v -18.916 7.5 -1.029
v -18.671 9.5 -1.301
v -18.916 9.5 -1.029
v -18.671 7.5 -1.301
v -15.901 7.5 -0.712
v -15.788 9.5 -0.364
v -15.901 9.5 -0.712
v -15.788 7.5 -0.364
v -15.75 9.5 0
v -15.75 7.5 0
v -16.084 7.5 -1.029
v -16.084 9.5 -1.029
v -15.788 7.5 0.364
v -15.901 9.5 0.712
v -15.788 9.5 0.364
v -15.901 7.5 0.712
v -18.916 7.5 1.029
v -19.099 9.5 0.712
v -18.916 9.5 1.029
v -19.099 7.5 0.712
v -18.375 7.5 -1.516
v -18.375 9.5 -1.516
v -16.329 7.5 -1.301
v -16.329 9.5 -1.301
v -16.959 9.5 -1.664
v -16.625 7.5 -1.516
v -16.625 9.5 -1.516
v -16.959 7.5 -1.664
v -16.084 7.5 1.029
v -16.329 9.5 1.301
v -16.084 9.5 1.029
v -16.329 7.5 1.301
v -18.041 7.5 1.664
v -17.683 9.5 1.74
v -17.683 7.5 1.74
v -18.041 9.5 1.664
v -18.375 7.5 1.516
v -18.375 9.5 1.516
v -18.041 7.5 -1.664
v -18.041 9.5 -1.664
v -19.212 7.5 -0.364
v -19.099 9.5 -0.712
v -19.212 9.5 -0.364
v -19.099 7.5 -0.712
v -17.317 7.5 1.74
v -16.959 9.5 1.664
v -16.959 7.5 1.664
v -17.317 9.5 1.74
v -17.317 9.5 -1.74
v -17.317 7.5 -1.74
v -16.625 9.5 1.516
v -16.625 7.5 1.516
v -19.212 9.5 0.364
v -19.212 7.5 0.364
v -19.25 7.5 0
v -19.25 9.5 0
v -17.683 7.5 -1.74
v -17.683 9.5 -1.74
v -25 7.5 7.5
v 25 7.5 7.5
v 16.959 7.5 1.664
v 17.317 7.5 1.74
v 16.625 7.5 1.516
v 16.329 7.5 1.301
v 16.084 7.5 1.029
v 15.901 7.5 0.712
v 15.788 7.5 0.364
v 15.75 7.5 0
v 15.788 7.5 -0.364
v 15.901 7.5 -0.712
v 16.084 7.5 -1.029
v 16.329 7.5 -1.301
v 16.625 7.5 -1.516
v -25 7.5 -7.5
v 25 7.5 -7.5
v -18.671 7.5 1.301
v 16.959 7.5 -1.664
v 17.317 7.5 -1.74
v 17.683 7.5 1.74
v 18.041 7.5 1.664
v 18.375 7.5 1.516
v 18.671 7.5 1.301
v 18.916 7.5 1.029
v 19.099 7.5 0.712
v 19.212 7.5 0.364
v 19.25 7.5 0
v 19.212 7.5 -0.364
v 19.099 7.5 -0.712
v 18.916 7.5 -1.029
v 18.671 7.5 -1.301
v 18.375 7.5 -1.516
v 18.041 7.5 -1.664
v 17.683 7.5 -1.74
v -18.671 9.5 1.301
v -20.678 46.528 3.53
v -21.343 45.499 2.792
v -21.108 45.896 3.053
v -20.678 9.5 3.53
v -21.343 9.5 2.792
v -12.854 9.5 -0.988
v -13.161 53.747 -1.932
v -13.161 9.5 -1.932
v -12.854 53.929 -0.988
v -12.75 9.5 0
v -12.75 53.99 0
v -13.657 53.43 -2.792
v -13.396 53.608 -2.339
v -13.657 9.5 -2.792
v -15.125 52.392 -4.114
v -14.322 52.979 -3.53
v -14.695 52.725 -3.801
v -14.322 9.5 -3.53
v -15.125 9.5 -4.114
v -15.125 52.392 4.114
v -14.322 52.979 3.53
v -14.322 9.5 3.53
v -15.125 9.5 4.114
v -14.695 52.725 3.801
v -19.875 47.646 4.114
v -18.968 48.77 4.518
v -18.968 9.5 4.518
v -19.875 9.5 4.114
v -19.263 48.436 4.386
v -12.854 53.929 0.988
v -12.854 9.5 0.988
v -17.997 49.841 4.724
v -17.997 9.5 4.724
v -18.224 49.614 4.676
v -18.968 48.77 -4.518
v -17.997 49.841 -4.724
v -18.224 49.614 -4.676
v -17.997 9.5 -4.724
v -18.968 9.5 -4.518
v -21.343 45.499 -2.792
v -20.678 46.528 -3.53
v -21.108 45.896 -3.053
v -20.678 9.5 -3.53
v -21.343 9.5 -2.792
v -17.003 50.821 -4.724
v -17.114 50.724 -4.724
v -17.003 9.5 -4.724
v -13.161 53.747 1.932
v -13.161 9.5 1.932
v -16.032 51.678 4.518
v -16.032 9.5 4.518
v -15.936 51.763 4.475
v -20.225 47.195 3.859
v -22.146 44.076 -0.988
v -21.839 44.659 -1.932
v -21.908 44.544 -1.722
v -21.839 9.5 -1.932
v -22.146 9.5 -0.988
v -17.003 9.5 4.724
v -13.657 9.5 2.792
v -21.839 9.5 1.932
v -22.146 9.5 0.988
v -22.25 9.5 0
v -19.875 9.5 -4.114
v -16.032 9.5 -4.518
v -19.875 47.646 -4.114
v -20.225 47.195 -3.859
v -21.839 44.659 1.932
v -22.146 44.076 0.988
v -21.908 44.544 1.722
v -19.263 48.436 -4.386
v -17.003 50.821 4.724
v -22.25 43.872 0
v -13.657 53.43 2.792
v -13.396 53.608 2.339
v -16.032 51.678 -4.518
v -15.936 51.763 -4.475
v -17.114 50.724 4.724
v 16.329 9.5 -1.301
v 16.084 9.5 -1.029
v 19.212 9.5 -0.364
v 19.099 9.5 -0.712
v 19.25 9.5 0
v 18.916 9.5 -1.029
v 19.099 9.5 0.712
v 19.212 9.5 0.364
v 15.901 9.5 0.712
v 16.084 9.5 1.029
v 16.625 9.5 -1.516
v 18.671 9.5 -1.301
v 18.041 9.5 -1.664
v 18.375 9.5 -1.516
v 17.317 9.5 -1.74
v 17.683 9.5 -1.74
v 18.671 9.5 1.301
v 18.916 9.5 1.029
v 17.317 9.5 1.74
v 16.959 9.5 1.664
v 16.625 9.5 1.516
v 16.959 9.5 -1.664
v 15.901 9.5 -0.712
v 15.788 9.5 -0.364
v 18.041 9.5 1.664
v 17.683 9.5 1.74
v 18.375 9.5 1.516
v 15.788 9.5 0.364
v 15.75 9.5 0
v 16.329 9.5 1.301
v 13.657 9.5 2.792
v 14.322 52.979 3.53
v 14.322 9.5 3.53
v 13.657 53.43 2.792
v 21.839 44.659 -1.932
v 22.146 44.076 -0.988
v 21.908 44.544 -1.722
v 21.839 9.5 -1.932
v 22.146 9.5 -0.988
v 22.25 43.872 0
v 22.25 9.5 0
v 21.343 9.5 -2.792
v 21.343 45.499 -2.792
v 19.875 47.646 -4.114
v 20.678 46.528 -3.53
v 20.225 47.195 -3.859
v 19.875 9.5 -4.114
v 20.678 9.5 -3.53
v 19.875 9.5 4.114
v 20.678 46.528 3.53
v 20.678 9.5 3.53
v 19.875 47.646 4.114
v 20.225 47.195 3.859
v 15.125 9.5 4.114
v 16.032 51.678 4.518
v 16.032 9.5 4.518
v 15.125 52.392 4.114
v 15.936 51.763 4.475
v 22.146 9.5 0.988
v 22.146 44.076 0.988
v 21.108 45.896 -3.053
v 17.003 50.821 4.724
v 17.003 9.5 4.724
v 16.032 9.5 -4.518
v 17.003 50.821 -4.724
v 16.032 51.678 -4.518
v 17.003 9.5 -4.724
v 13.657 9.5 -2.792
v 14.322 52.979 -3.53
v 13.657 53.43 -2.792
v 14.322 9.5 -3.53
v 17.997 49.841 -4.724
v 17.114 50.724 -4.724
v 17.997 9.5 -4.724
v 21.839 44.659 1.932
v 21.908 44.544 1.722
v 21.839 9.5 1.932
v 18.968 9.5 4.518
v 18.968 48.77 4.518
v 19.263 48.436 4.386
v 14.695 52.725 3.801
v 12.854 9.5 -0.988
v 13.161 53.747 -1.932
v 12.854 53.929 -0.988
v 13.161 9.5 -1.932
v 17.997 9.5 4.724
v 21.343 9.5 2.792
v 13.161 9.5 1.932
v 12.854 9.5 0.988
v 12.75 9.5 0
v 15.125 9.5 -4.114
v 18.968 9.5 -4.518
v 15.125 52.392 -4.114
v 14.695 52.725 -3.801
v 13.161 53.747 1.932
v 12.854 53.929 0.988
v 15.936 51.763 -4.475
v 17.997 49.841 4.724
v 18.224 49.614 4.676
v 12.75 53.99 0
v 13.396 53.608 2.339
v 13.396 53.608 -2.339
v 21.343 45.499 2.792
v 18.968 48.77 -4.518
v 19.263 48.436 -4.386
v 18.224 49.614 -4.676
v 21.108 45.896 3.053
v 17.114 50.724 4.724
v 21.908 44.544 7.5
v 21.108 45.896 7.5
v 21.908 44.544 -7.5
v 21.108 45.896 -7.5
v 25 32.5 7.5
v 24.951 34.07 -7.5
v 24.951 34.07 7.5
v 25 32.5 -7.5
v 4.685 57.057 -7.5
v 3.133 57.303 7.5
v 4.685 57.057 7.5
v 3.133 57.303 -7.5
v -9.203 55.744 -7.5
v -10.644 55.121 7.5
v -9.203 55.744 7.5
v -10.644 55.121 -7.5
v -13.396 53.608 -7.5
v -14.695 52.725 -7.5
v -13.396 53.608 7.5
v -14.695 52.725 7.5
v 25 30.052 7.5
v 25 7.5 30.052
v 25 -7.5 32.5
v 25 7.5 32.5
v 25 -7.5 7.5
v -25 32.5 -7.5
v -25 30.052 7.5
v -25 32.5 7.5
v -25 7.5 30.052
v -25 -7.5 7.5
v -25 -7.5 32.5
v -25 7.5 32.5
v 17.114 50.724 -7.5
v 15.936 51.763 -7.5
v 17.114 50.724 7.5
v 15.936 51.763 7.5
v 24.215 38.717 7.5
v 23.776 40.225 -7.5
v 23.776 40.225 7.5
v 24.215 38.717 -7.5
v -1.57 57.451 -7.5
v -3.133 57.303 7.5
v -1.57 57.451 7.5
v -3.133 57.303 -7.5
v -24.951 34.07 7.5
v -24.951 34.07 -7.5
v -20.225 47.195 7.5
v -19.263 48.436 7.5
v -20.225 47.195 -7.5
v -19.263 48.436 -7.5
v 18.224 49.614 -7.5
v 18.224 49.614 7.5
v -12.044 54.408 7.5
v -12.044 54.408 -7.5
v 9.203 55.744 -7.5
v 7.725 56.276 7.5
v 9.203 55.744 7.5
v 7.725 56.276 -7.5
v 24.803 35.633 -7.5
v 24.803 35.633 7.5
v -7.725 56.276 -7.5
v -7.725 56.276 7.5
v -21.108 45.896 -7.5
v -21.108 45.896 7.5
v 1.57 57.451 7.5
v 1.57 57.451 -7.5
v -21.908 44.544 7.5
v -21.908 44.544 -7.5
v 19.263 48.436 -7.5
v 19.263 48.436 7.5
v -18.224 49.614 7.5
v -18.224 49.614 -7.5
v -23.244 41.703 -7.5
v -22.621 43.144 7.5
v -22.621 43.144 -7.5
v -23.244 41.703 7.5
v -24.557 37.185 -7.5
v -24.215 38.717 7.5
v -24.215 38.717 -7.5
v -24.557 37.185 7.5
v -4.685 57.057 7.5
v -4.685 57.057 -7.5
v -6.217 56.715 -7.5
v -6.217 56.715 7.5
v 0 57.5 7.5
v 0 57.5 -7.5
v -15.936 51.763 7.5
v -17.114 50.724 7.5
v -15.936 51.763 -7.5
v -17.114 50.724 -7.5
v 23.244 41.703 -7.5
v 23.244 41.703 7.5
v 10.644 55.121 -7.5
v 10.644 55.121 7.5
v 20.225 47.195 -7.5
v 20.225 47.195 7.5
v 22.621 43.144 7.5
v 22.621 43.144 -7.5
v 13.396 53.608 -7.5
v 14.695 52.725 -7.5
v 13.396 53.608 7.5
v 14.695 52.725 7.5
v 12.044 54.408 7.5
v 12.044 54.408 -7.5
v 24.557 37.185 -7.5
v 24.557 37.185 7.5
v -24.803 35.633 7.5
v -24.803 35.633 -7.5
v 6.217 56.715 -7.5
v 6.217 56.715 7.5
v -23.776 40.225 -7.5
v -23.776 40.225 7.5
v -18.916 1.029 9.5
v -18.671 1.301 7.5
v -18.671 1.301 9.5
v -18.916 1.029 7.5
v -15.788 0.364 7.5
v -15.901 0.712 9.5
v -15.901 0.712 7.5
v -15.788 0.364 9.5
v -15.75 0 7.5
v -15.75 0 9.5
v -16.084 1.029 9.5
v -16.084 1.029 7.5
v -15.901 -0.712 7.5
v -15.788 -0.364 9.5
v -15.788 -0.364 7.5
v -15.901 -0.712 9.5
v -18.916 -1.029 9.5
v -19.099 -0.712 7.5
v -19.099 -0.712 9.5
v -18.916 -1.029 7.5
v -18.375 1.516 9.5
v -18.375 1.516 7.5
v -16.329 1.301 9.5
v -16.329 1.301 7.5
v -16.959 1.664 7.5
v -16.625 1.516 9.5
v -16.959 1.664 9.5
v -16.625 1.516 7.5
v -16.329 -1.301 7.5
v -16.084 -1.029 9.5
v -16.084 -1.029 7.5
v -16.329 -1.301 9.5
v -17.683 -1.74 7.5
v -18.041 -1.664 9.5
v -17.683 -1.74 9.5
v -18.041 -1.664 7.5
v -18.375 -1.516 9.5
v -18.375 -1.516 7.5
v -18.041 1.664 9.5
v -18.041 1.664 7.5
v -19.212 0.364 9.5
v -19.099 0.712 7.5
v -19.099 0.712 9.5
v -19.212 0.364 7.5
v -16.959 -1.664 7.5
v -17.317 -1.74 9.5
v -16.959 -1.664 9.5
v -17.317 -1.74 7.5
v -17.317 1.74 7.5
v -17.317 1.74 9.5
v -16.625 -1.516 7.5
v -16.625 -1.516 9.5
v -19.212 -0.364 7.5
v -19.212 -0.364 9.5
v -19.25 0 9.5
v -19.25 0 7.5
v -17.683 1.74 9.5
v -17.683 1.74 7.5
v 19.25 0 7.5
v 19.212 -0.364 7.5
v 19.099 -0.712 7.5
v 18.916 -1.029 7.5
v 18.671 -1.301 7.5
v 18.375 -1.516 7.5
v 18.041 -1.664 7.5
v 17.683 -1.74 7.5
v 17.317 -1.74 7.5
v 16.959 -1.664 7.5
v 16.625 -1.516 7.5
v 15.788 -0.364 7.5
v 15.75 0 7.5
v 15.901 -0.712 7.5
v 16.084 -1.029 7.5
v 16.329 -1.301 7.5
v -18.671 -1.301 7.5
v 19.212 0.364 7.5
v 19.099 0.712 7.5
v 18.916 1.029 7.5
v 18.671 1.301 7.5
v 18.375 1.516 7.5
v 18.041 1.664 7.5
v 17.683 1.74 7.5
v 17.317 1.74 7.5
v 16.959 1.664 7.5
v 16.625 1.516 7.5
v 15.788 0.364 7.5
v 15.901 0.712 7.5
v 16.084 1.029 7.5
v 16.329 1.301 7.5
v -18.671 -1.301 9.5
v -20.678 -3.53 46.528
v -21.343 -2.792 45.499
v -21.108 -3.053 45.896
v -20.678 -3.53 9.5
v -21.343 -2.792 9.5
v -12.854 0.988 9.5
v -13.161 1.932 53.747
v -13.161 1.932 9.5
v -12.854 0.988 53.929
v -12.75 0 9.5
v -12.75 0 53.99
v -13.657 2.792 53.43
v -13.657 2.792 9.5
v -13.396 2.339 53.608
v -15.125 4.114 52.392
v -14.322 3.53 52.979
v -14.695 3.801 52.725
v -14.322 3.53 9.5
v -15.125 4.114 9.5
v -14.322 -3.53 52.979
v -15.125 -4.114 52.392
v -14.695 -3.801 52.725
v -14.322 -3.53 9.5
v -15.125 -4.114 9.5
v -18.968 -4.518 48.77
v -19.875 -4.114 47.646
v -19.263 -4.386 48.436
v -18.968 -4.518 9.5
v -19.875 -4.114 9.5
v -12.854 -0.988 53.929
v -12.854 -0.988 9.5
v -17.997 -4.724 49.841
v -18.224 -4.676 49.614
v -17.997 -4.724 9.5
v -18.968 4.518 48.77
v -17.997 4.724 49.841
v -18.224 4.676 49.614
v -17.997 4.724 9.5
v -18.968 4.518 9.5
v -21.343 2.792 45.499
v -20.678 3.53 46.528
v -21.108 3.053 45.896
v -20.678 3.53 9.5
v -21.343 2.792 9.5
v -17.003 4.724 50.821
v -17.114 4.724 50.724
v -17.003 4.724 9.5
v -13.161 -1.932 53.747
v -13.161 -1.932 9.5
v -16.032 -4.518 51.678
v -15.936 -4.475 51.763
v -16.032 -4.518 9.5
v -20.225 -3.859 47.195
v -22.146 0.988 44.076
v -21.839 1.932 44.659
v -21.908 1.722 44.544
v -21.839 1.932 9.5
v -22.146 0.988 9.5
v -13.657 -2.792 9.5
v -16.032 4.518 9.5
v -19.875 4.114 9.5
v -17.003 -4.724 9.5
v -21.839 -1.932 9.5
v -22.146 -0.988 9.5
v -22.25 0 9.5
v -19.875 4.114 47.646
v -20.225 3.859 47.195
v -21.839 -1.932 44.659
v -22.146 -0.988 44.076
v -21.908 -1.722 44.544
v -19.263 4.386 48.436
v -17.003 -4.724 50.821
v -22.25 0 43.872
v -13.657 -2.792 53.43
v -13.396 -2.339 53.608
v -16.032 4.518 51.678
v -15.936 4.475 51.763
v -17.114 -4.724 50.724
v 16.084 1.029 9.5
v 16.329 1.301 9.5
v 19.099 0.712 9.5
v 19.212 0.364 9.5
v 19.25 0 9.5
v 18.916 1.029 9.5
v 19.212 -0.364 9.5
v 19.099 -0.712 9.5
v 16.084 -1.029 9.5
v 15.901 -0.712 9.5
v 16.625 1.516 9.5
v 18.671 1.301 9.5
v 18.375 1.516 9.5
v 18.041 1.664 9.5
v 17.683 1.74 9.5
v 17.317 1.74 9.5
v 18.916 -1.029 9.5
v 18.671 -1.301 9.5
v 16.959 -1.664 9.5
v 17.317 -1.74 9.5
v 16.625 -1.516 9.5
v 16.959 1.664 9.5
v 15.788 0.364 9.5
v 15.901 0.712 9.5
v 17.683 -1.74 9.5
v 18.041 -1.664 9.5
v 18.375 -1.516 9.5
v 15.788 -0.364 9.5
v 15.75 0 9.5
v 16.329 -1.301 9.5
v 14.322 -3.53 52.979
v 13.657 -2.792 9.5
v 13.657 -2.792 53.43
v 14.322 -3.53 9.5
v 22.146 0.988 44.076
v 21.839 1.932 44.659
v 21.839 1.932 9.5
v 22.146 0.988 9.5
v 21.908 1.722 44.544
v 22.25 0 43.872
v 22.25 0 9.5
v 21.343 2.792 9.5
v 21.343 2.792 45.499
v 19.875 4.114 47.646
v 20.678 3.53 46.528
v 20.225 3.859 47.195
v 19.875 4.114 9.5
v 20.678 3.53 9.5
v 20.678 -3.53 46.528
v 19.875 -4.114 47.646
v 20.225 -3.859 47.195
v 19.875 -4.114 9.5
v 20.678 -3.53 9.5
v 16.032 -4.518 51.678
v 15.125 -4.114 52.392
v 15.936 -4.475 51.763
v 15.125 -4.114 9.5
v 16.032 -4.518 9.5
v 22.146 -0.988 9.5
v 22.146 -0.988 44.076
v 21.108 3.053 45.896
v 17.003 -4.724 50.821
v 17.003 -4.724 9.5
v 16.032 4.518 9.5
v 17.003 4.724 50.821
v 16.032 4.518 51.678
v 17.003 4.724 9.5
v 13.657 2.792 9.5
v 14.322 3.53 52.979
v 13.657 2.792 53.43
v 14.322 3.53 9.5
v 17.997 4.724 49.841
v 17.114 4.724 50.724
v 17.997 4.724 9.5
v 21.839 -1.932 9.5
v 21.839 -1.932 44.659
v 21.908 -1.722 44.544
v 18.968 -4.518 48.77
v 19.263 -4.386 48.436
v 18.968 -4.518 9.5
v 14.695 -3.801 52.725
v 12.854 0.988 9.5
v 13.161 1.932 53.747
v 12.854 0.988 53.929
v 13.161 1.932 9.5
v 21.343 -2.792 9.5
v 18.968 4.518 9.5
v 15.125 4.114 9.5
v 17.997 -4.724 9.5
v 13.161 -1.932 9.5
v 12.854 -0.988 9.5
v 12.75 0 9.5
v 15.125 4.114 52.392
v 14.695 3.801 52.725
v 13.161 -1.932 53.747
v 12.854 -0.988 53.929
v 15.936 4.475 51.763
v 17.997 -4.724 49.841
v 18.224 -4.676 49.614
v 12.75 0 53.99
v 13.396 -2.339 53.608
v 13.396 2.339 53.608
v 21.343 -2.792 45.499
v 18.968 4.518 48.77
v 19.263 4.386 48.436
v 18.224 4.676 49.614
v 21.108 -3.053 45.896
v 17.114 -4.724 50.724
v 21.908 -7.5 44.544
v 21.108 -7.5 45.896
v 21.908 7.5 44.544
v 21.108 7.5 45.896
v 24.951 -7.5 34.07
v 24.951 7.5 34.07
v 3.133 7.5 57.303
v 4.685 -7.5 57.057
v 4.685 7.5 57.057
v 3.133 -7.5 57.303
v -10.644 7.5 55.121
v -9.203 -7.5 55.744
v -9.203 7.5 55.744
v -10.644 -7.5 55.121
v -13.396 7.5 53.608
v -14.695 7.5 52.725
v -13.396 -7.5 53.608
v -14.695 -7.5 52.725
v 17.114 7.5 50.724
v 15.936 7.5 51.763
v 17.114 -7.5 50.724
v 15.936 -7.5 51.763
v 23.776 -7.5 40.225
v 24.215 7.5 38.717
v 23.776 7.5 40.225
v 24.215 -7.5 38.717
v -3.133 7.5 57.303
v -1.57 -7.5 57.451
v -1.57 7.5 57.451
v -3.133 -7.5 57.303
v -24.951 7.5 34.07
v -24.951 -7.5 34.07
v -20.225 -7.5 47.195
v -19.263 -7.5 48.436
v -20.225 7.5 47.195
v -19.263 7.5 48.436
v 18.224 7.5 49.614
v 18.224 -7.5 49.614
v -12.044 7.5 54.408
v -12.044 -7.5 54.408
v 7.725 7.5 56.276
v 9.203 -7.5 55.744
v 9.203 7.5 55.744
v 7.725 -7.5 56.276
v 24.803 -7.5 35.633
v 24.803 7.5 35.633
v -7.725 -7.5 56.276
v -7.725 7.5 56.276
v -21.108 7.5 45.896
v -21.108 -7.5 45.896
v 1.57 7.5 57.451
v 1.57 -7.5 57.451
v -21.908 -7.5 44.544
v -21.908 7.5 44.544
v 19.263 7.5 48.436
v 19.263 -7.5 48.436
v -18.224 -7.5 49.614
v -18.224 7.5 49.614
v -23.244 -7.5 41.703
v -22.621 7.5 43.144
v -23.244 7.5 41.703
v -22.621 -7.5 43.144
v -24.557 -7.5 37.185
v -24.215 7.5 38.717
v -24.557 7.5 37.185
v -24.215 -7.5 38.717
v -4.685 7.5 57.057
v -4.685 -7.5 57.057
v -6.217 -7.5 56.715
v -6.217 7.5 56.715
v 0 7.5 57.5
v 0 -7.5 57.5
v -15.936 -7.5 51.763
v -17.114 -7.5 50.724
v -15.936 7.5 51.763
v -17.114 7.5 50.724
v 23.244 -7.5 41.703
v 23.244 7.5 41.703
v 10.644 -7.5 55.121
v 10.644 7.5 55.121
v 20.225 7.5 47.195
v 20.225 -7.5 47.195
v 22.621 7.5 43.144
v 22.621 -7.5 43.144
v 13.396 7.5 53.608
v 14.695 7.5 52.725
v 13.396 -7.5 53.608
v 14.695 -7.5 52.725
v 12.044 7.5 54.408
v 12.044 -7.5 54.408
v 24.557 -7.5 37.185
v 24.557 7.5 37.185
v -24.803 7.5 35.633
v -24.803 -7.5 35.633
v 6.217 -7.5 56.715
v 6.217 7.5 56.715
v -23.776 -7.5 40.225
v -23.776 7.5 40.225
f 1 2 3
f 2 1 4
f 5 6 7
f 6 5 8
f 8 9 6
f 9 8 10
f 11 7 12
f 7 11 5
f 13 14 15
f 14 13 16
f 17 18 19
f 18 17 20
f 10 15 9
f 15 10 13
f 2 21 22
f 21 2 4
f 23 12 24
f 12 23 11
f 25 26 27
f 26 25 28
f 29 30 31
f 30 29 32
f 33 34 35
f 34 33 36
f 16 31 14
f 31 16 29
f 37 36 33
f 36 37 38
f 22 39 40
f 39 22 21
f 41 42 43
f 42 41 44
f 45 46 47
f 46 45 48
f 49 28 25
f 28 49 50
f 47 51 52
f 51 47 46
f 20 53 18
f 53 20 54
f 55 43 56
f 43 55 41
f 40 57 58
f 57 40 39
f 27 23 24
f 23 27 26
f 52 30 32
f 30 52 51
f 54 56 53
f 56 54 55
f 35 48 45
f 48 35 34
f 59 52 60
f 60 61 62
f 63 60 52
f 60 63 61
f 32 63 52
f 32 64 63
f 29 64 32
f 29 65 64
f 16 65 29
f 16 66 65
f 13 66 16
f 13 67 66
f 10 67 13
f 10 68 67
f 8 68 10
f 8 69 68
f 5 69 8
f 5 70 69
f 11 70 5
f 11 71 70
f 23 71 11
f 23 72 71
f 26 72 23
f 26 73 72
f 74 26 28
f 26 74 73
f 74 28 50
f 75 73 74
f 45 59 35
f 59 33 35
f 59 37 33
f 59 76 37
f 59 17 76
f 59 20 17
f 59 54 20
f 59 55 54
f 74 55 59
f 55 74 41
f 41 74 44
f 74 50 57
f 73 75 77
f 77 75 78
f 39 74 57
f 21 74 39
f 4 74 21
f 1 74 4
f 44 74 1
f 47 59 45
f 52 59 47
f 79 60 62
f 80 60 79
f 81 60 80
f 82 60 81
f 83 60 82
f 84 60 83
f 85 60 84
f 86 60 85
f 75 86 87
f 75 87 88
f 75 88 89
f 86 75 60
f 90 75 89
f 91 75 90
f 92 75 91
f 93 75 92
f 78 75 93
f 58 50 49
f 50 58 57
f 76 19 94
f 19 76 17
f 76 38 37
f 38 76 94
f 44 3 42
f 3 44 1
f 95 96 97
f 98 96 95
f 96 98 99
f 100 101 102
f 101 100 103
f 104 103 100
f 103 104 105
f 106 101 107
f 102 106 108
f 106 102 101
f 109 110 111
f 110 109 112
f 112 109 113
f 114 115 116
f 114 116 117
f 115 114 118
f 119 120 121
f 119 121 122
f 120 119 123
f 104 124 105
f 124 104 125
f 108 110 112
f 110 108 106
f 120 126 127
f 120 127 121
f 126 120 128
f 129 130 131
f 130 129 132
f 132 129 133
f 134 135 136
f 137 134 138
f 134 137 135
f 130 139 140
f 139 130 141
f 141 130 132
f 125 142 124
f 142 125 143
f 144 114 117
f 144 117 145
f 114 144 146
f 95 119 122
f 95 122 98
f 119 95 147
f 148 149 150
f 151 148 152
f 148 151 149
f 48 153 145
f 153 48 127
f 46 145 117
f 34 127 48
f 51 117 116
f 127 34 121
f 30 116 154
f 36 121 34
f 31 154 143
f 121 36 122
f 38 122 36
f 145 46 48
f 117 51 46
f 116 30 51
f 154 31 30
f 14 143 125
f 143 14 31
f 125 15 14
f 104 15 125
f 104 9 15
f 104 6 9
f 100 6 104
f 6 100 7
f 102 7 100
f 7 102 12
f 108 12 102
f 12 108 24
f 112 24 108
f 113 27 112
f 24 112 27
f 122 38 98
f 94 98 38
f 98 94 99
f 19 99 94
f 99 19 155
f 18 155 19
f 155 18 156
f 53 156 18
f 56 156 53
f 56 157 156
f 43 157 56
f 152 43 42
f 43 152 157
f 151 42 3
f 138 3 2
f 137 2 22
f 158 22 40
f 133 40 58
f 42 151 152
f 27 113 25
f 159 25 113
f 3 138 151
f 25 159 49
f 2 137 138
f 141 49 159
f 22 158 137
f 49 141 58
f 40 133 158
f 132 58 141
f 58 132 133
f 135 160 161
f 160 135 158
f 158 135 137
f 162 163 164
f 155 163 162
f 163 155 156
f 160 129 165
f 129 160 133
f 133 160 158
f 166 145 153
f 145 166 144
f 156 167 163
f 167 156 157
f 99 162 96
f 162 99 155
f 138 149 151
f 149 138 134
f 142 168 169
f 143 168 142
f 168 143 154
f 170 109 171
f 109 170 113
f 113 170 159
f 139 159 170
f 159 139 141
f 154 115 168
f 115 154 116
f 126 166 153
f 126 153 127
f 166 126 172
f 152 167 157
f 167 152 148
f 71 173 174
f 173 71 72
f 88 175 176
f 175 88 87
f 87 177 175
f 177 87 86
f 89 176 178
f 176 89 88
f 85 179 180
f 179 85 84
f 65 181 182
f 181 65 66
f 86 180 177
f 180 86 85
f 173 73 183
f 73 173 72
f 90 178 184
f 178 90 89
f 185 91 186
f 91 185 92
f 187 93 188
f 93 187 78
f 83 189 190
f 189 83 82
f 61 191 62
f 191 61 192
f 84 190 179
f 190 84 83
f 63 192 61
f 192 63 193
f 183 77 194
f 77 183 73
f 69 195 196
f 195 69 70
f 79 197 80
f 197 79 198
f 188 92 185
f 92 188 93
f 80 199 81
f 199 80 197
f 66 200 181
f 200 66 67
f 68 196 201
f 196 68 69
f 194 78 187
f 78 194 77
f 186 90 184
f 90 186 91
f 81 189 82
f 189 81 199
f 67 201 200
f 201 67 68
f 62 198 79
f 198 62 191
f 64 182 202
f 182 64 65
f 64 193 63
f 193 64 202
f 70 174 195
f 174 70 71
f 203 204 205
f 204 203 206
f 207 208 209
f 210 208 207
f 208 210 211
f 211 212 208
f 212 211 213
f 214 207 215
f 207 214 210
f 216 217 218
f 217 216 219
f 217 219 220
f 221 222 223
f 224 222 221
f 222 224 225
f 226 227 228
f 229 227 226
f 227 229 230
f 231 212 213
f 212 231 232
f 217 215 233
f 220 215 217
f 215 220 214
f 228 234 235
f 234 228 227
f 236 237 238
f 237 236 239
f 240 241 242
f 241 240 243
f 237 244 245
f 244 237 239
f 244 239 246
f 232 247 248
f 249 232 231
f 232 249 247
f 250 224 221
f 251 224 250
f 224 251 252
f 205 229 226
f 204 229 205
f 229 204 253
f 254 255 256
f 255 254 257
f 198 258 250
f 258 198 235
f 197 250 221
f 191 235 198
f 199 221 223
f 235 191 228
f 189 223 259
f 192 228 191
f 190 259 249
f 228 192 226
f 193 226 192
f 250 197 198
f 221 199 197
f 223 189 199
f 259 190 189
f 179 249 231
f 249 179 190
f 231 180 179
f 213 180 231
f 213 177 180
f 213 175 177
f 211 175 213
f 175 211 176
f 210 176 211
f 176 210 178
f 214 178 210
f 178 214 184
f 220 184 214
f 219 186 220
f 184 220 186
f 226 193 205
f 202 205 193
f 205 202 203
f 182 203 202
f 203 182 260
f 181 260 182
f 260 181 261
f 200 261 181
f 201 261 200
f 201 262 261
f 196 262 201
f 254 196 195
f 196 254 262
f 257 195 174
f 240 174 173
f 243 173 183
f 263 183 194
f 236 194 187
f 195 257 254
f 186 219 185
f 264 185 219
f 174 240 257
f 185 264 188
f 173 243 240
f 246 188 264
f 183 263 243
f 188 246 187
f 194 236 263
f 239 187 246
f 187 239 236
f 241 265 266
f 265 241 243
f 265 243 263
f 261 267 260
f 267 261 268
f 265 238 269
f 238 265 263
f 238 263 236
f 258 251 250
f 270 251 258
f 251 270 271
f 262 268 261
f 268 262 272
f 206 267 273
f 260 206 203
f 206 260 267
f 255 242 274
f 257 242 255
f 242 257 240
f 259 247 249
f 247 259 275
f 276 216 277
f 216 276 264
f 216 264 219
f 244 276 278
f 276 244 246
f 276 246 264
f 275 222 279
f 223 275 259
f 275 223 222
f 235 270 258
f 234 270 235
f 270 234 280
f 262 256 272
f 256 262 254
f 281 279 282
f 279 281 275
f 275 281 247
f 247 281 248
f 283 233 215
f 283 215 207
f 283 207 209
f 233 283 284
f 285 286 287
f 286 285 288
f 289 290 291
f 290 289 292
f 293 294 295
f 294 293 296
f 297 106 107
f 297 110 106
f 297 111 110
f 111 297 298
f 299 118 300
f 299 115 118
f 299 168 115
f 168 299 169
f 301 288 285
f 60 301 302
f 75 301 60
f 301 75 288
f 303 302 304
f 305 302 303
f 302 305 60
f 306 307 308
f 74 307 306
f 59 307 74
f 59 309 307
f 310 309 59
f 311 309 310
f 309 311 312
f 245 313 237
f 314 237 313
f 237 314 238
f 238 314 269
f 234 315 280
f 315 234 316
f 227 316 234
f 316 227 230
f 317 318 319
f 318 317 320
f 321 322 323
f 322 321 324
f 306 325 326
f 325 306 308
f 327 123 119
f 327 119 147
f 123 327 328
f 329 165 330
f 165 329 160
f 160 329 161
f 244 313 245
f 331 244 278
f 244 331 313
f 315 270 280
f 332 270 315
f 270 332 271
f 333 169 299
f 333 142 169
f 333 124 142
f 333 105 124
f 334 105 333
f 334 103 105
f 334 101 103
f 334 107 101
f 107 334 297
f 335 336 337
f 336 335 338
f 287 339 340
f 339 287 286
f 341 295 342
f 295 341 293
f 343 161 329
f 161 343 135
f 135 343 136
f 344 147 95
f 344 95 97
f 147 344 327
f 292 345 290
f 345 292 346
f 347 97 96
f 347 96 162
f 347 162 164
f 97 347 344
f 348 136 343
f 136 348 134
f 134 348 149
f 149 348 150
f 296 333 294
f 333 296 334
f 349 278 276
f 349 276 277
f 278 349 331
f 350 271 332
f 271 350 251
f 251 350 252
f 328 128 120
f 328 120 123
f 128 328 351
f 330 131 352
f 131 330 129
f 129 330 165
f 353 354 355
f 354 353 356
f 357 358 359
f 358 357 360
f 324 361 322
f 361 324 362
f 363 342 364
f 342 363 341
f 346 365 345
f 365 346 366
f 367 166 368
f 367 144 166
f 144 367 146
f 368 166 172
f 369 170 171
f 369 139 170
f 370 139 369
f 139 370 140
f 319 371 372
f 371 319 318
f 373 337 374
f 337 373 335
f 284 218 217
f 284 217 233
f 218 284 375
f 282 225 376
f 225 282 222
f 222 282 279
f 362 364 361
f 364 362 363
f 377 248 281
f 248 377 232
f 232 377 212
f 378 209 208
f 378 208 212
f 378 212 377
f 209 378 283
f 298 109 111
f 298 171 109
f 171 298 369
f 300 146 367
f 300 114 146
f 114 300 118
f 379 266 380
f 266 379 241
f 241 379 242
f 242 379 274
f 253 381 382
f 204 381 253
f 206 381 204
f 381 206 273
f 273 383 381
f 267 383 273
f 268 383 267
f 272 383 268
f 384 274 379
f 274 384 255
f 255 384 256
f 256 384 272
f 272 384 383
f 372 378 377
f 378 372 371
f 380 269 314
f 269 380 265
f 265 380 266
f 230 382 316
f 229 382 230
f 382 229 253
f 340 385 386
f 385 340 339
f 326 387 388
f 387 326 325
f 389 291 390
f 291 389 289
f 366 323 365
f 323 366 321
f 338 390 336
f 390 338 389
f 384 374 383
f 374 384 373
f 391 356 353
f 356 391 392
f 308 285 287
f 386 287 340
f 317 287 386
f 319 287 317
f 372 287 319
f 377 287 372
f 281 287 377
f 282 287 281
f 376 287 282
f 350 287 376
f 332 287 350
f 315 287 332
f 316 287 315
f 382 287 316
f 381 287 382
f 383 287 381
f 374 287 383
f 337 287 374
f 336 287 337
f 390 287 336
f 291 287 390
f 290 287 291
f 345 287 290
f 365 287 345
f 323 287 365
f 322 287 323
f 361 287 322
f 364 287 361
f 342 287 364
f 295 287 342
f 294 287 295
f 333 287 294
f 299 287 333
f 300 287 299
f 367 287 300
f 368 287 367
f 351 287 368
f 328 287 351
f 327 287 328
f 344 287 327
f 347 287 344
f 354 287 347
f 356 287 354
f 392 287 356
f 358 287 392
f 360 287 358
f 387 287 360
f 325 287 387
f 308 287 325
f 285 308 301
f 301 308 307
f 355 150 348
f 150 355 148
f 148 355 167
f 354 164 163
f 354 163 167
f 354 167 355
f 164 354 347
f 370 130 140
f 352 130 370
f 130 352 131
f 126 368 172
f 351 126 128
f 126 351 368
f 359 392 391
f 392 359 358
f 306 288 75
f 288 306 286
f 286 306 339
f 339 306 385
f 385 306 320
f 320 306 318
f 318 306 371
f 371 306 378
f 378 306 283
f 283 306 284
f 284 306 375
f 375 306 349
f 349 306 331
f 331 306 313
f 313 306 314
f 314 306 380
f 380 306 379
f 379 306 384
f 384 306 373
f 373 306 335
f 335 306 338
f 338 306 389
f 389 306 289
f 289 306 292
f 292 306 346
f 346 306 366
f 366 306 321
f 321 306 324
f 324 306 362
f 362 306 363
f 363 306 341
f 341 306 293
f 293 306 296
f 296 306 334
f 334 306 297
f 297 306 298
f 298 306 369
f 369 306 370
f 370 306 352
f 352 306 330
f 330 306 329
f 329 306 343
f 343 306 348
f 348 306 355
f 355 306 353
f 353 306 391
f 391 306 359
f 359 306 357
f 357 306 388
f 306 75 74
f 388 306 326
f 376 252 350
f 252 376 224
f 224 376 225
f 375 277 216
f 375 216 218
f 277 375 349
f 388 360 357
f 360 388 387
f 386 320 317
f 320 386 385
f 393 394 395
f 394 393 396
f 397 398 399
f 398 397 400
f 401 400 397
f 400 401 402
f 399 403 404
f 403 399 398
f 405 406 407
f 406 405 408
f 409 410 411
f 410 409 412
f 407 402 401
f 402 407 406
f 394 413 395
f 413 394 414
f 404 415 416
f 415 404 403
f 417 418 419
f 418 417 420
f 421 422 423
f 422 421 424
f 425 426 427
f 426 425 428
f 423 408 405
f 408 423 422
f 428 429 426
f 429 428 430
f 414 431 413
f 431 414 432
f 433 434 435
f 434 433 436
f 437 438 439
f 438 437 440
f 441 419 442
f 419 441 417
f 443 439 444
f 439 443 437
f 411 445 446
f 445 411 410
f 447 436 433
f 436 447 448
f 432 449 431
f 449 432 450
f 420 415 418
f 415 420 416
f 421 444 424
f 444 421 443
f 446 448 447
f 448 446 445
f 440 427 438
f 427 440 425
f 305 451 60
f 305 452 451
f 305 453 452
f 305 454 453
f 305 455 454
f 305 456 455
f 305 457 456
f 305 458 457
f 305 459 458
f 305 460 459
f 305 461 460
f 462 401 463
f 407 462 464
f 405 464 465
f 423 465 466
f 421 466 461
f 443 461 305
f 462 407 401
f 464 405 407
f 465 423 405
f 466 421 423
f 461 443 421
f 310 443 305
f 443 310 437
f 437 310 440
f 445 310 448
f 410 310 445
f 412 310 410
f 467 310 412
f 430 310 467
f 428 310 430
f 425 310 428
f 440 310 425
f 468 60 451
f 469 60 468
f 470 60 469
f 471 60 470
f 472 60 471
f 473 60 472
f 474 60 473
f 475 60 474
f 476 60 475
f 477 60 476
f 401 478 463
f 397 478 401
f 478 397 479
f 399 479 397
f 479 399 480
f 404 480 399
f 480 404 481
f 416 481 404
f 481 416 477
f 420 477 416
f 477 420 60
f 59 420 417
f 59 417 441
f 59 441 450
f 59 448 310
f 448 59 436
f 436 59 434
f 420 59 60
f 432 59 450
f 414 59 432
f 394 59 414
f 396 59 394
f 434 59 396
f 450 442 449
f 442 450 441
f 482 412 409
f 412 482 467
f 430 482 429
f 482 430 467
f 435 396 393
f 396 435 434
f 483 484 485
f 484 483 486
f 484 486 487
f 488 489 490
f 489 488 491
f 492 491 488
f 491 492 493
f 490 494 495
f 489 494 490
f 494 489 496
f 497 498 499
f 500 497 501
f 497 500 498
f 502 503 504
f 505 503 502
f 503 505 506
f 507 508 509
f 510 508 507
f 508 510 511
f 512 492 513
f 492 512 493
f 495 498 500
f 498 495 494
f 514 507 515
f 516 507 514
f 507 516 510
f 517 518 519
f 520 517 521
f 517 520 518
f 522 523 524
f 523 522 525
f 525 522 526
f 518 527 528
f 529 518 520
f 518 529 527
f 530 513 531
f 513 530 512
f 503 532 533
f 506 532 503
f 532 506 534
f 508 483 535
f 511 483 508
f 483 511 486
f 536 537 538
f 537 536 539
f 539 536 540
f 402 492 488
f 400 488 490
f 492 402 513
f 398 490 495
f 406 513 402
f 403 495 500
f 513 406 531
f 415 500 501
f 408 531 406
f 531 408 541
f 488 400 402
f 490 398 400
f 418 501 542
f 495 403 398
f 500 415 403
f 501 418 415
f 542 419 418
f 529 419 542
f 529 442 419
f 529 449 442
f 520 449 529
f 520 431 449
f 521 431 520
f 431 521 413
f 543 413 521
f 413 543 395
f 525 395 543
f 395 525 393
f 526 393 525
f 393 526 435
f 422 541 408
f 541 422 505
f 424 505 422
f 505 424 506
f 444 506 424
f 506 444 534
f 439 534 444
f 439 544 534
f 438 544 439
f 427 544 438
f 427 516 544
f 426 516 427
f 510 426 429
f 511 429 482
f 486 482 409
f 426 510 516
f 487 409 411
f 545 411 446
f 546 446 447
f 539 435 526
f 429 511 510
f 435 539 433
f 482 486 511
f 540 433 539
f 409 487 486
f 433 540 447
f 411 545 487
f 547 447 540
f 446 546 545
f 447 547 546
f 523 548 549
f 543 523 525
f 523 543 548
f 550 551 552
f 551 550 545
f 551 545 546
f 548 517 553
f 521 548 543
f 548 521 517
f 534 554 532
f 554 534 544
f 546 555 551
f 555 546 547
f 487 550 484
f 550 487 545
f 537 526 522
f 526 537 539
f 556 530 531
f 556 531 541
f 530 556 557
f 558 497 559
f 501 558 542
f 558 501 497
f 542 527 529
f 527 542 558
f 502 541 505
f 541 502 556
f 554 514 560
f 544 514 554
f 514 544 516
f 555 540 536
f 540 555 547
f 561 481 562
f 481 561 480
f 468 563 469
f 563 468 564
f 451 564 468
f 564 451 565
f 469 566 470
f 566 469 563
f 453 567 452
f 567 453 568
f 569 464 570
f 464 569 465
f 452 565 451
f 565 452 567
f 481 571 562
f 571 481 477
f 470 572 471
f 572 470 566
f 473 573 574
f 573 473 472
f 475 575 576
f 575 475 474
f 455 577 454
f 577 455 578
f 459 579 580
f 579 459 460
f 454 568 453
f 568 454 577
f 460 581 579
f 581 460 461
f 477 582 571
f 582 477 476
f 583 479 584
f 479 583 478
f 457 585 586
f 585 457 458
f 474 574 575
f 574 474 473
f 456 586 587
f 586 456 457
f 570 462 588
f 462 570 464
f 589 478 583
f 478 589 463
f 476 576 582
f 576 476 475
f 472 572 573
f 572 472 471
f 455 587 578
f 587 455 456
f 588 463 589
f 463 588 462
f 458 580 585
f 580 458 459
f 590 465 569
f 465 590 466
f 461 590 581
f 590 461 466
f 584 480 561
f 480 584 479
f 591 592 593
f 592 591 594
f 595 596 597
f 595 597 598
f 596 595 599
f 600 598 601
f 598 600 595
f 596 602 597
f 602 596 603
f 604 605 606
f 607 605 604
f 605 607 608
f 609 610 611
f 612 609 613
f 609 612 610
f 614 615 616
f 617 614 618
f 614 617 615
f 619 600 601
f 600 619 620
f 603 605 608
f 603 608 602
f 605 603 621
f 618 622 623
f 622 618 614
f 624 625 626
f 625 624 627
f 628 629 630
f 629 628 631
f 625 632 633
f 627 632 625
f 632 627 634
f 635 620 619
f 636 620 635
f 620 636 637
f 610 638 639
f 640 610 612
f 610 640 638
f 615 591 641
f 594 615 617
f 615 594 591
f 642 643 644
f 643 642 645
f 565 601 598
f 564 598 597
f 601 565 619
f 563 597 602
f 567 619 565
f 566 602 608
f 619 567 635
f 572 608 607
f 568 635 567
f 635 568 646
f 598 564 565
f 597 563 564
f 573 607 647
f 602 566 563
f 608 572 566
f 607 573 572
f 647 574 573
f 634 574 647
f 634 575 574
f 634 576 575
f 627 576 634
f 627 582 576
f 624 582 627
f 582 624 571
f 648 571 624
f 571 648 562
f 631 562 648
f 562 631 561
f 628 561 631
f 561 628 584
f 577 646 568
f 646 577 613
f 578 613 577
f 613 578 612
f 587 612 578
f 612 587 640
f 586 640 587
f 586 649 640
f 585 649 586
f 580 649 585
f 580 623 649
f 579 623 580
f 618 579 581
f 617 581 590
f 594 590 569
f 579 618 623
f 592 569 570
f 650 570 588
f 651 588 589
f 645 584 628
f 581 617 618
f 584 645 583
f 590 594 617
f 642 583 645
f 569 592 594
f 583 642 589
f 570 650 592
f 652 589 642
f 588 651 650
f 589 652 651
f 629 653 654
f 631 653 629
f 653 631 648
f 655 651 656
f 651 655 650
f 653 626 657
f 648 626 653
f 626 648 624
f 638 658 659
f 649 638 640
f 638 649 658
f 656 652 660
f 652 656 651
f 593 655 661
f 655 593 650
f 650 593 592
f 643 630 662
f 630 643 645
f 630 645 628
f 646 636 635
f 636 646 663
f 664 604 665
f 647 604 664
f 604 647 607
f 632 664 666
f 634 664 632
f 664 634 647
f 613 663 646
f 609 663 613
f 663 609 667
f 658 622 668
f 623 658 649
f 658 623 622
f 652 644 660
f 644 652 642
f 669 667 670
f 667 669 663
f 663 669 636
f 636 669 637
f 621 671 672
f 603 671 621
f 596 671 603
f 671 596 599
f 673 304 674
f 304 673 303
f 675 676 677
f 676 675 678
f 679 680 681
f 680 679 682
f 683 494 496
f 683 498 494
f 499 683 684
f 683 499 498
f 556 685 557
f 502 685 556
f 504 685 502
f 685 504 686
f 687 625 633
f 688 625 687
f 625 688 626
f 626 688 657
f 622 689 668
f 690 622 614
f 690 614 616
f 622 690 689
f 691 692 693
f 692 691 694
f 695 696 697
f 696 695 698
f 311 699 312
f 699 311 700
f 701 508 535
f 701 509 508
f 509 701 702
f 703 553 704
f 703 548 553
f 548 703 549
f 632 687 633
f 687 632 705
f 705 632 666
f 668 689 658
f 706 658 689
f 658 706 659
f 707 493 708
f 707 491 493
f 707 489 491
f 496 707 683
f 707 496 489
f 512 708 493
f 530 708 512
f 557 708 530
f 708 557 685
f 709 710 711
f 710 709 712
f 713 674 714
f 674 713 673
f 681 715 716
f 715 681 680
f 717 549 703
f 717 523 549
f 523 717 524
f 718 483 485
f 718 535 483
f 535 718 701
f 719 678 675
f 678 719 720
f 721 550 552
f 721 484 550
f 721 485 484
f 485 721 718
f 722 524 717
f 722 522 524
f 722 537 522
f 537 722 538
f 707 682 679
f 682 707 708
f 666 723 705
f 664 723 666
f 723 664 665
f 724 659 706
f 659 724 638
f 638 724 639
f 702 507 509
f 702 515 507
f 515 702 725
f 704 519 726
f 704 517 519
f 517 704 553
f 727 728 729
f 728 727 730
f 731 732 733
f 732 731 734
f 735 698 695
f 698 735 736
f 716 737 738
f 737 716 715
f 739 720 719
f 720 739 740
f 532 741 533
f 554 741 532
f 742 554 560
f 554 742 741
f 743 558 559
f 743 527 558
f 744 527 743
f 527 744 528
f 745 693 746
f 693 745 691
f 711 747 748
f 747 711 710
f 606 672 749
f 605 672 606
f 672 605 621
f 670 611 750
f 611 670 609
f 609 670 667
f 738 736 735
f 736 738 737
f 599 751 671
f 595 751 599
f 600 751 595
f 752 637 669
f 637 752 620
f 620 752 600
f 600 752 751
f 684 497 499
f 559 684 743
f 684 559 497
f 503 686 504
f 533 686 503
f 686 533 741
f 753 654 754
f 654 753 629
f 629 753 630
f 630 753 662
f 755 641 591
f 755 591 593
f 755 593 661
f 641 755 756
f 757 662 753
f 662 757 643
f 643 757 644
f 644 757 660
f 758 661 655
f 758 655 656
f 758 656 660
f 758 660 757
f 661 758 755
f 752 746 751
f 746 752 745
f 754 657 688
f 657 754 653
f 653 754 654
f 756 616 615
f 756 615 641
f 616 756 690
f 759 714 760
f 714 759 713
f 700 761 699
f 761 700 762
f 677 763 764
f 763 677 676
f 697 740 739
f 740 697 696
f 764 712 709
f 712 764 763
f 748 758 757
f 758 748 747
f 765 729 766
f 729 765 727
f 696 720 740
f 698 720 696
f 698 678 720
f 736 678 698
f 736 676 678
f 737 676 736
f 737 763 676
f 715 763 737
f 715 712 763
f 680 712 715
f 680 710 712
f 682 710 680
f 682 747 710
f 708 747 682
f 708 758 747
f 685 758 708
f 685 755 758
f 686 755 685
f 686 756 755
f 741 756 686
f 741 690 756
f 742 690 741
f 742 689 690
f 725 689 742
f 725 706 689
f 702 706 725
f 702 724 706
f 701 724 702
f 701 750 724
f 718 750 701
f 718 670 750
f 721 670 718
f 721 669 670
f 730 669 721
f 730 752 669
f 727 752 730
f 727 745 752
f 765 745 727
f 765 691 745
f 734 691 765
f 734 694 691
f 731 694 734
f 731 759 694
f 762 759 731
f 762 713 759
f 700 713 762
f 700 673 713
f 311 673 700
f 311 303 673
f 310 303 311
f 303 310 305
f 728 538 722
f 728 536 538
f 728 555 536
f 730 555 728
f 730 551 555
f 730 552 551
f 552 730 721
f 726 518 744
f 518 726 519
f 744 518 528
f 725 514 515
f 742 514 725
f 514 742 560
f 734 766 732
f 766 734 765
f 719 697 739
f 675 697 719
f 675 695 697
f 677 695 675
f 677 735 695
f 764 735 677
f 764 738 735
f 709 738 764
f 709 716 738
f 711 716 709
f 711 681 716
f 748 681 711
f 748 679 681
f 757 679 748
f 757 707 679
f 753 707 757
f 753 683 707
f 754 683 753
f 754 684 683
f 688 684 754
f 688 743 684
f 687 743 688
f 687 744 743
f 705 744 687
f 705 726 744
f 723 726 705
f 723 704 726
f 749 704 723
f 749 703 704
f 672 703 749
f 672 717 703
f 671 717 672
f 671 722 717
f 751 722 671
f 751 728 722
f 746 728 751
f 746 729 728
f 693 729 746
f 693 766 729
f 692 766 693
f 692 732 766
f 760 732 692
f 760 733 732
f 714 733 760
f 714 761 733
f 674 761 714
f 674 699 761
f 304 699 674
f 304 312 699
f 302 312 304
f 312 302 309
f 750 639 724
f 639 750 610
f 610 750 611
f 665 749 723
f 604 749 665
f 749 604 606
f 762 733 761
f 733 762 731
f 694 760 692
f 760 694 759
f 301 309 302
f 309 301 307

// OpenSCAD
$fn = 100;
width = 50;
length = 60;
feeder_d = 50;
hole_d = 3.5;
makerbeam_w = 15;

feeder_shelf(width, length, feeder_d, hole_d, makerbeam_w);

module feeder_shelf(
    width,
    length,
    feeder_d,
    hole_d,
    makerbeam_w) {

    for (i = [0,1]){
        rotate([i*90,0,0])
        translate([0,(makerbeam_w/2),0])
        difference(){
            // Shelf
            translate([0,feeder_d/6,0])
            hull(){
                cube([feeder_d,feeder_d/3, makerbeam_w], center=true);
                translate([0,feeder_d/3,0])
                cylinder(d = feeder_d, h = makerbeam_w, center=true);
            }

            // Holes
            #rotate([-90,0,0])
            for (j = [-1,1]){
                translate([j*(feeder_d/2 - (makerbeam_w/2)),0,0]){
                cylinder(d = hole_d, h=feeder_d, $fn = 30);
                translate([0,0,2])
                cylinder(d = hole_d+6, h=feeder_d, $fn = 30);
                }
            }
        }
    }

    // Side supports
    translate([0,makerbeam_w/2,0])
    intersection(){
        translate([0,feeder_d/2,feeder_d/2+(makerbeam_w/2)])
        cube([feeder_d, feeder_d, feeder_d], center=true);
        rotate([0,90,0])
        rotate([0,0,45])
        cube([feeder_d-(makerbeam_w/2), feeder_d-(makerbeam_w/2), feeder_d], center=true);
    }
}
